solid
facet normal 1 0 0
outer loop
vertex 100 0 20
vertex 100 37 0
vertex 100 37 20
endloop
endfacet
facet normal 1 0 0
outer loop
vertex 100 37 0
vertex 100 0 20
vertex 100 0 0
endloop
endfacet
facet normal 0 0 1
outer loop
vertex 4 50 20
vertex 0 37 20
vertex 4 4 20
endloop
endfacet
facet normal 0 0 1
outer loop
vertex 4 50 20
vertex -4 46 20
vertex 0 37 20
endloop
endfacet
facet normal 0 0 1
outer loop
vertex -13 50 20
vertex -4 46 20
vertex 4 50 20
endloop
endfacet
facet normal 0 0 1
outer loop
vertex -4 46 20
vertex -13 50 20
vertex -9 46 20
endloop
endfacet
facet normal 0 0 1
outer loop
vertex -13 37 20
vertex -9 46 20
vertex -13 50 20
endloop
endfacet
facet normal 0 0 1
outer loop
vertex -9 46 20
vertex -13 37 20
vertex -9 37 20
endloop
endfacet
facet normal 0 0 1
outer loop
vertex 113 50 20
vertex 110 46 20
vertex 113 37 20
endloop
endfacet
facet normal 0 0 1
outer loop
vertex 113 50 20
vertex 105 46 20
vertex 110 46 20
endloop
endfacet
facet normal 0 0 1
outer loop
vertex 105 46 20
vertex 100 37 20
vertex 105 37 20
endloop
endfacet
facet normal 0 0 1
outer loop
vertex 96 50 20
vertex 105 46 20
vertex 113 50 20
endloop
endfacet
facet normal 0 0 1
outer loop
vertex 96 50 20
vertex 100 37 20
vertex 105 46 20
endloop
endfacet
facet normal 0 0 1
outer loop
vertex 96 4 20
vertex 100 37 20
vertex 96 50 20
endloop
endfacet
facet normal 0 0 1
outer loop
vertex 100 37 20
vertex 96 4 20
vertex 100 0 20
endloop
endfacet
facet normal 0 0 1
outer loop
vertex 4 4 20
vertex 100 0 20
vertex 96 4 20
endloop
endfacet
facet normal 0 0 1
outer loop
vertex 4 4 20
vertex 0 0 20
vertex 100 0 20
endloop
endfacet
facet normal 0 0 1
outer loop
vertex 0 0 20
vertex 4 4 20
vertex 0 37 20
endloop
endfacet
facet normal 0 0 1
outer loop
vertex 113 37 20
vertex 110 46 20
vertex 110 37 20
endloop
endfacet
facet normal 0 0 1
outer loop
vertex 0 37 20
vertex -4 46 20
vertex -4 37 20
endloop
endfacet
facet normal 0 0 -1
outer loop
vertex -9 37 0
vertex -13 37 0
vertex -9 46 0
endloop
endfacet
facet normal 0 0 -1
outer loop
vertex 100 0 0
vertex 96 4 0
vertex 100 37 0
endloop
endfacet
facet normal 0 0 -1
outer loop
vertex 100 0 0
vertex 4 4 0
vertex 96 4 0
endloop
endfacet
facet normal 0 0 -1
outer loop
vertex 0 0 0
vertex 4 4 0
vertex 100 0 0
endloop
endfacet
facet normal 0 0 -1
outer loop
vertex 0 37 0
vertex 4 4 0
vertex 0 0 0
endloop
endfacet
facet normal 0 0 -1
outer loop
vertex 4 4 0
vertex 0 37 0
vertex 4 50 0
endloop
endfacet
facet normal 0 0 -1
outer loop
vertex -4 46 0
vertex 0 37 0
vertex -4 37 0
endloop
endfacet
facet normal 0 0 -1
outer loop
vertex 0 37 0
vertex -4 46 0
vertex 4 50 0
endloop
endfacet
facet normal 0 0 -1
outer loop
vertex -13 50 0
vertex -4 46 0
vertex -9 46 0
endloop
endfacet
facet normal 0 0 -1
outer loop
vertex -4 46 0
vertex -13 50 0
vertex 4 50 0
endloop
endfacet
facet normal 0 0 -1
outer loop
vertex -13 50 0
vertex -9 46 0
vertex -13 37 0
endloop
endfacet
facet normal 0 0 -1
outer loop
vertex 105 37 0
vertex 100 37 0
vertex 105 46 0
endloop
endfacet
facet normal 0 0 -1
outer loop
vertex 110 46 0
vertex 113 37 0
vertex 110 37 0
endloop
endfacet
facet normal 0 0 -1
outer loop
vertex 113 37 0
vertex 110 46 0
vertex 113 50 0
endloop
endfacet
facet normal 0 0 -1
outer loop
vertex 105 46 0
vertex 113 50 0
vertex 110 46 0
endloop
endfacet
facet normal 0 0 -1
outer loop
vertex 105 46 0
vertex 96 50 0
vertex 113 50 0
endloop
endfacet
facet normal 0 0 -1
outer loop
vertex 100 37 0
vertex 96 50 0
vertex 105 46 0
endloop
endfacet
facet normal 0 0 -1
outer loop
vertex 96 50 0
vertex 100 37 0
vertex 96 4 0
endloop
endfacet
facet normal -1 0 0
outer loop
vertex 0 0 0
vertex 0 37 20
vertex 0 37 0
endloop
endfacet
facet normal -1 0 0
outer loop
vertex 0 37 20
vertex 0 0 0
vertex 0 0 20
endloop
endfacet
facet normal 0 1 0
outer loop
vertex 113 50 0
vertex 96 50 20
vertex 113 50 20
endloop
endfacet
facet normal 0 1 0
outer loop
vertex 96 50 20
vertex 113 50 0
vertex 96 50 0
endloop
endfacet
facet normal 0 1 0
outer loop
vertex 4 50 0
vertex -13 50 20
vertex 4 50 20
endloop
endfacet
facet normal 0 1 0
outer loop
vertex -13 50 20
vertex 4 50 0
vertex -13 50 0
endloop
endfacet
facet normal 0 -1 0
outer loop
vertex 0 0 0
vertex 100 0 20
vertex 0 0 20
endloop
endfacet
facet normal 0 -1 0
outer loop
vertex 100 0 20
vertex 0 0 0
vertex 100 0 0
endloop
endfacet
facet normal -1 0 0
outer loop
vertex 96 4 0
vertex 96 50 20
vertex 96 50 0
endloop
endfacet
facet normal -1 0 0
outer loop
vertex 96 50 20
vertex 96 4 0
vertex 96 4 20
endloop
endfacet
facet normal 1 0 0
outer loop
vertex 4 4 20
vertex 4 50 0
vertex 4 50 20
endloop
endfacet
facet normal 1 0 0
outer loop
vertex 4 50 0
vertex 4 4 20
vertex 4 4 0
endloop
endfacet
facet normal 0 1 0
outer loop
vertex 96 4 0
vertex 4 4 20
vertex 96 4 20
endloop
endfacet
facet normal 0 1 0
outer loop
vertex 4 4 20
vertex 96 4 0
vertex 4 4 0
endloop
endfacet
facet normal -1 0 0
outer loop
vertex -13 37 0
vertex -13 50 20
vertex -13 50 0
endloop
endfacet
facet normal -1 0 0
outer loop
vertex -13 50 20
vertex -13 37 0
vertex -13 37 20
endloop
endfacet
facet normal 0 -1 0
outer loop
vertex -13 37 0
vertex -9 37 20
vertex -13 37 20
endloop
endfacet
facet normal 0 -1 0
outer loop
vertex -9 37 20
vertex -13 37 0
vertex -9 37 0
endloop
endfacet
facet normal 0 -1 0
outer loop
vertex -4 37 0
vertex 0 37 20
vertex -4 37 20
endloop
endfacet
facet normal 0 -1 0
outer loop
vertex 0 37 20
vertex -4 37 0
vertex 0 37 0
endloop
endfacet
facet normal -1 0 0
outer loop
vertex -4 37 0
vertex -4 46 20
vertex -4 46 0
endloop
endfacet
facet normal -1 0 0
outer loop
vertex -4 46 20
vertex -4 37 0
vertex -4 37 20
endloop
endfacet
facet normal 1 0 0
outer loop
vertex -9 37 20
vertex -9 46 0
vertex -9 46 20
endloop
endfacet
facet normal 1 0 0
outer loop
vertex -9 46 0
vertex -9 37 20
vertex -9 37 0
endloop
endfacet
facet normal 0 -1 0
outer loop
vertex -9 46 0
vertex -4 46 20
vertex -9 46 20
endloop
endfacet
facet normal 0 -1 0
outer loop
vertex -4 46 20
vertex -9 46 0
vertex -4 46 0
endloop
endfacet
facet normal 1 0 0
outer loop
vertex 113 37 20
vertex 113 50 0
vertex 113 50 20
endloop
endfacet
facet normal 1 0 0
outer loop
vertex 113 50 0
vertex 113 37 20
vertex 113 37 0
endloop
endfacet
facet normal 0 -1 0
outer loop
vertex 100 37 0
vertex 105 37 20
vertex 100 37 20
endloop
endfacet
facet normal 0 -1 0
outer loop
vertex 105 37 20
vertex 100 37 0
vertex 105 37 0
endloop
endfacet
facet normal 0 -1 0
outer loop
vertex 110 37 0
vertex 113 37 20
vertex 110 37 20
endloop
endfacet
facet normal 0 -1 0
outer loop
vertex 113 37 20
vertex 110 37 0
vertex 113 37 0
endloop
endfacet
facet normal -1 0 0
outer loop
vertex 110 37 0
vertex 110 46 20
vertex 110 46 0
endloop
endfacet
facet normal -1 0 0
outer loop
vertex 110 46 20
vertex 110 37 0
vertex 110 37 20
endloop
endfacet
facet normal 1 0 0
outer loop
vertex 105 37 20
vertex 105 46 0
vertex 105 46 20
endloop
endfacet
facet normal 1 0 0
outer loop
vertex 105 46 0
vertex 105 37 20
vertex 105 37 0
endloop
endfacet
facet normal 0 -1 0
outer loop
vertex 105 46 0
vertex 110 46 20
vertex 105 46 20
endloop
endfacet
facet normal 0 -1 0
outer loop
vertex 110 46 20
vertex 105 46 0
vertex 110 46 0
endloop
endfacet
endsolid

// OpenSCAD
//Holder Length
l=100;

//Holder Height
h=50;

//Holder Thickness
t=4;

//Holder Width
w=20;

//Rung Thickness
r=5;
difference()
{
cube([l,h,w]);	
translate([t,t,0]) cube([l-2*t, h-t, w]);
}
difference()
{
translate([-2*t-r,h-2*t-r,0]) cube([2*t+r, 2*t+r, w]);
translate([-t-r,h-2*t-r,0]) cube([r,r+t,w]);
}
difference()
{
translate([l,h-2*t-r,0]) cube([2*t+r, 2*t+r, w]);
translate([l+r,h-2*t-r,0]) cube([r,r+t,w]);
}
